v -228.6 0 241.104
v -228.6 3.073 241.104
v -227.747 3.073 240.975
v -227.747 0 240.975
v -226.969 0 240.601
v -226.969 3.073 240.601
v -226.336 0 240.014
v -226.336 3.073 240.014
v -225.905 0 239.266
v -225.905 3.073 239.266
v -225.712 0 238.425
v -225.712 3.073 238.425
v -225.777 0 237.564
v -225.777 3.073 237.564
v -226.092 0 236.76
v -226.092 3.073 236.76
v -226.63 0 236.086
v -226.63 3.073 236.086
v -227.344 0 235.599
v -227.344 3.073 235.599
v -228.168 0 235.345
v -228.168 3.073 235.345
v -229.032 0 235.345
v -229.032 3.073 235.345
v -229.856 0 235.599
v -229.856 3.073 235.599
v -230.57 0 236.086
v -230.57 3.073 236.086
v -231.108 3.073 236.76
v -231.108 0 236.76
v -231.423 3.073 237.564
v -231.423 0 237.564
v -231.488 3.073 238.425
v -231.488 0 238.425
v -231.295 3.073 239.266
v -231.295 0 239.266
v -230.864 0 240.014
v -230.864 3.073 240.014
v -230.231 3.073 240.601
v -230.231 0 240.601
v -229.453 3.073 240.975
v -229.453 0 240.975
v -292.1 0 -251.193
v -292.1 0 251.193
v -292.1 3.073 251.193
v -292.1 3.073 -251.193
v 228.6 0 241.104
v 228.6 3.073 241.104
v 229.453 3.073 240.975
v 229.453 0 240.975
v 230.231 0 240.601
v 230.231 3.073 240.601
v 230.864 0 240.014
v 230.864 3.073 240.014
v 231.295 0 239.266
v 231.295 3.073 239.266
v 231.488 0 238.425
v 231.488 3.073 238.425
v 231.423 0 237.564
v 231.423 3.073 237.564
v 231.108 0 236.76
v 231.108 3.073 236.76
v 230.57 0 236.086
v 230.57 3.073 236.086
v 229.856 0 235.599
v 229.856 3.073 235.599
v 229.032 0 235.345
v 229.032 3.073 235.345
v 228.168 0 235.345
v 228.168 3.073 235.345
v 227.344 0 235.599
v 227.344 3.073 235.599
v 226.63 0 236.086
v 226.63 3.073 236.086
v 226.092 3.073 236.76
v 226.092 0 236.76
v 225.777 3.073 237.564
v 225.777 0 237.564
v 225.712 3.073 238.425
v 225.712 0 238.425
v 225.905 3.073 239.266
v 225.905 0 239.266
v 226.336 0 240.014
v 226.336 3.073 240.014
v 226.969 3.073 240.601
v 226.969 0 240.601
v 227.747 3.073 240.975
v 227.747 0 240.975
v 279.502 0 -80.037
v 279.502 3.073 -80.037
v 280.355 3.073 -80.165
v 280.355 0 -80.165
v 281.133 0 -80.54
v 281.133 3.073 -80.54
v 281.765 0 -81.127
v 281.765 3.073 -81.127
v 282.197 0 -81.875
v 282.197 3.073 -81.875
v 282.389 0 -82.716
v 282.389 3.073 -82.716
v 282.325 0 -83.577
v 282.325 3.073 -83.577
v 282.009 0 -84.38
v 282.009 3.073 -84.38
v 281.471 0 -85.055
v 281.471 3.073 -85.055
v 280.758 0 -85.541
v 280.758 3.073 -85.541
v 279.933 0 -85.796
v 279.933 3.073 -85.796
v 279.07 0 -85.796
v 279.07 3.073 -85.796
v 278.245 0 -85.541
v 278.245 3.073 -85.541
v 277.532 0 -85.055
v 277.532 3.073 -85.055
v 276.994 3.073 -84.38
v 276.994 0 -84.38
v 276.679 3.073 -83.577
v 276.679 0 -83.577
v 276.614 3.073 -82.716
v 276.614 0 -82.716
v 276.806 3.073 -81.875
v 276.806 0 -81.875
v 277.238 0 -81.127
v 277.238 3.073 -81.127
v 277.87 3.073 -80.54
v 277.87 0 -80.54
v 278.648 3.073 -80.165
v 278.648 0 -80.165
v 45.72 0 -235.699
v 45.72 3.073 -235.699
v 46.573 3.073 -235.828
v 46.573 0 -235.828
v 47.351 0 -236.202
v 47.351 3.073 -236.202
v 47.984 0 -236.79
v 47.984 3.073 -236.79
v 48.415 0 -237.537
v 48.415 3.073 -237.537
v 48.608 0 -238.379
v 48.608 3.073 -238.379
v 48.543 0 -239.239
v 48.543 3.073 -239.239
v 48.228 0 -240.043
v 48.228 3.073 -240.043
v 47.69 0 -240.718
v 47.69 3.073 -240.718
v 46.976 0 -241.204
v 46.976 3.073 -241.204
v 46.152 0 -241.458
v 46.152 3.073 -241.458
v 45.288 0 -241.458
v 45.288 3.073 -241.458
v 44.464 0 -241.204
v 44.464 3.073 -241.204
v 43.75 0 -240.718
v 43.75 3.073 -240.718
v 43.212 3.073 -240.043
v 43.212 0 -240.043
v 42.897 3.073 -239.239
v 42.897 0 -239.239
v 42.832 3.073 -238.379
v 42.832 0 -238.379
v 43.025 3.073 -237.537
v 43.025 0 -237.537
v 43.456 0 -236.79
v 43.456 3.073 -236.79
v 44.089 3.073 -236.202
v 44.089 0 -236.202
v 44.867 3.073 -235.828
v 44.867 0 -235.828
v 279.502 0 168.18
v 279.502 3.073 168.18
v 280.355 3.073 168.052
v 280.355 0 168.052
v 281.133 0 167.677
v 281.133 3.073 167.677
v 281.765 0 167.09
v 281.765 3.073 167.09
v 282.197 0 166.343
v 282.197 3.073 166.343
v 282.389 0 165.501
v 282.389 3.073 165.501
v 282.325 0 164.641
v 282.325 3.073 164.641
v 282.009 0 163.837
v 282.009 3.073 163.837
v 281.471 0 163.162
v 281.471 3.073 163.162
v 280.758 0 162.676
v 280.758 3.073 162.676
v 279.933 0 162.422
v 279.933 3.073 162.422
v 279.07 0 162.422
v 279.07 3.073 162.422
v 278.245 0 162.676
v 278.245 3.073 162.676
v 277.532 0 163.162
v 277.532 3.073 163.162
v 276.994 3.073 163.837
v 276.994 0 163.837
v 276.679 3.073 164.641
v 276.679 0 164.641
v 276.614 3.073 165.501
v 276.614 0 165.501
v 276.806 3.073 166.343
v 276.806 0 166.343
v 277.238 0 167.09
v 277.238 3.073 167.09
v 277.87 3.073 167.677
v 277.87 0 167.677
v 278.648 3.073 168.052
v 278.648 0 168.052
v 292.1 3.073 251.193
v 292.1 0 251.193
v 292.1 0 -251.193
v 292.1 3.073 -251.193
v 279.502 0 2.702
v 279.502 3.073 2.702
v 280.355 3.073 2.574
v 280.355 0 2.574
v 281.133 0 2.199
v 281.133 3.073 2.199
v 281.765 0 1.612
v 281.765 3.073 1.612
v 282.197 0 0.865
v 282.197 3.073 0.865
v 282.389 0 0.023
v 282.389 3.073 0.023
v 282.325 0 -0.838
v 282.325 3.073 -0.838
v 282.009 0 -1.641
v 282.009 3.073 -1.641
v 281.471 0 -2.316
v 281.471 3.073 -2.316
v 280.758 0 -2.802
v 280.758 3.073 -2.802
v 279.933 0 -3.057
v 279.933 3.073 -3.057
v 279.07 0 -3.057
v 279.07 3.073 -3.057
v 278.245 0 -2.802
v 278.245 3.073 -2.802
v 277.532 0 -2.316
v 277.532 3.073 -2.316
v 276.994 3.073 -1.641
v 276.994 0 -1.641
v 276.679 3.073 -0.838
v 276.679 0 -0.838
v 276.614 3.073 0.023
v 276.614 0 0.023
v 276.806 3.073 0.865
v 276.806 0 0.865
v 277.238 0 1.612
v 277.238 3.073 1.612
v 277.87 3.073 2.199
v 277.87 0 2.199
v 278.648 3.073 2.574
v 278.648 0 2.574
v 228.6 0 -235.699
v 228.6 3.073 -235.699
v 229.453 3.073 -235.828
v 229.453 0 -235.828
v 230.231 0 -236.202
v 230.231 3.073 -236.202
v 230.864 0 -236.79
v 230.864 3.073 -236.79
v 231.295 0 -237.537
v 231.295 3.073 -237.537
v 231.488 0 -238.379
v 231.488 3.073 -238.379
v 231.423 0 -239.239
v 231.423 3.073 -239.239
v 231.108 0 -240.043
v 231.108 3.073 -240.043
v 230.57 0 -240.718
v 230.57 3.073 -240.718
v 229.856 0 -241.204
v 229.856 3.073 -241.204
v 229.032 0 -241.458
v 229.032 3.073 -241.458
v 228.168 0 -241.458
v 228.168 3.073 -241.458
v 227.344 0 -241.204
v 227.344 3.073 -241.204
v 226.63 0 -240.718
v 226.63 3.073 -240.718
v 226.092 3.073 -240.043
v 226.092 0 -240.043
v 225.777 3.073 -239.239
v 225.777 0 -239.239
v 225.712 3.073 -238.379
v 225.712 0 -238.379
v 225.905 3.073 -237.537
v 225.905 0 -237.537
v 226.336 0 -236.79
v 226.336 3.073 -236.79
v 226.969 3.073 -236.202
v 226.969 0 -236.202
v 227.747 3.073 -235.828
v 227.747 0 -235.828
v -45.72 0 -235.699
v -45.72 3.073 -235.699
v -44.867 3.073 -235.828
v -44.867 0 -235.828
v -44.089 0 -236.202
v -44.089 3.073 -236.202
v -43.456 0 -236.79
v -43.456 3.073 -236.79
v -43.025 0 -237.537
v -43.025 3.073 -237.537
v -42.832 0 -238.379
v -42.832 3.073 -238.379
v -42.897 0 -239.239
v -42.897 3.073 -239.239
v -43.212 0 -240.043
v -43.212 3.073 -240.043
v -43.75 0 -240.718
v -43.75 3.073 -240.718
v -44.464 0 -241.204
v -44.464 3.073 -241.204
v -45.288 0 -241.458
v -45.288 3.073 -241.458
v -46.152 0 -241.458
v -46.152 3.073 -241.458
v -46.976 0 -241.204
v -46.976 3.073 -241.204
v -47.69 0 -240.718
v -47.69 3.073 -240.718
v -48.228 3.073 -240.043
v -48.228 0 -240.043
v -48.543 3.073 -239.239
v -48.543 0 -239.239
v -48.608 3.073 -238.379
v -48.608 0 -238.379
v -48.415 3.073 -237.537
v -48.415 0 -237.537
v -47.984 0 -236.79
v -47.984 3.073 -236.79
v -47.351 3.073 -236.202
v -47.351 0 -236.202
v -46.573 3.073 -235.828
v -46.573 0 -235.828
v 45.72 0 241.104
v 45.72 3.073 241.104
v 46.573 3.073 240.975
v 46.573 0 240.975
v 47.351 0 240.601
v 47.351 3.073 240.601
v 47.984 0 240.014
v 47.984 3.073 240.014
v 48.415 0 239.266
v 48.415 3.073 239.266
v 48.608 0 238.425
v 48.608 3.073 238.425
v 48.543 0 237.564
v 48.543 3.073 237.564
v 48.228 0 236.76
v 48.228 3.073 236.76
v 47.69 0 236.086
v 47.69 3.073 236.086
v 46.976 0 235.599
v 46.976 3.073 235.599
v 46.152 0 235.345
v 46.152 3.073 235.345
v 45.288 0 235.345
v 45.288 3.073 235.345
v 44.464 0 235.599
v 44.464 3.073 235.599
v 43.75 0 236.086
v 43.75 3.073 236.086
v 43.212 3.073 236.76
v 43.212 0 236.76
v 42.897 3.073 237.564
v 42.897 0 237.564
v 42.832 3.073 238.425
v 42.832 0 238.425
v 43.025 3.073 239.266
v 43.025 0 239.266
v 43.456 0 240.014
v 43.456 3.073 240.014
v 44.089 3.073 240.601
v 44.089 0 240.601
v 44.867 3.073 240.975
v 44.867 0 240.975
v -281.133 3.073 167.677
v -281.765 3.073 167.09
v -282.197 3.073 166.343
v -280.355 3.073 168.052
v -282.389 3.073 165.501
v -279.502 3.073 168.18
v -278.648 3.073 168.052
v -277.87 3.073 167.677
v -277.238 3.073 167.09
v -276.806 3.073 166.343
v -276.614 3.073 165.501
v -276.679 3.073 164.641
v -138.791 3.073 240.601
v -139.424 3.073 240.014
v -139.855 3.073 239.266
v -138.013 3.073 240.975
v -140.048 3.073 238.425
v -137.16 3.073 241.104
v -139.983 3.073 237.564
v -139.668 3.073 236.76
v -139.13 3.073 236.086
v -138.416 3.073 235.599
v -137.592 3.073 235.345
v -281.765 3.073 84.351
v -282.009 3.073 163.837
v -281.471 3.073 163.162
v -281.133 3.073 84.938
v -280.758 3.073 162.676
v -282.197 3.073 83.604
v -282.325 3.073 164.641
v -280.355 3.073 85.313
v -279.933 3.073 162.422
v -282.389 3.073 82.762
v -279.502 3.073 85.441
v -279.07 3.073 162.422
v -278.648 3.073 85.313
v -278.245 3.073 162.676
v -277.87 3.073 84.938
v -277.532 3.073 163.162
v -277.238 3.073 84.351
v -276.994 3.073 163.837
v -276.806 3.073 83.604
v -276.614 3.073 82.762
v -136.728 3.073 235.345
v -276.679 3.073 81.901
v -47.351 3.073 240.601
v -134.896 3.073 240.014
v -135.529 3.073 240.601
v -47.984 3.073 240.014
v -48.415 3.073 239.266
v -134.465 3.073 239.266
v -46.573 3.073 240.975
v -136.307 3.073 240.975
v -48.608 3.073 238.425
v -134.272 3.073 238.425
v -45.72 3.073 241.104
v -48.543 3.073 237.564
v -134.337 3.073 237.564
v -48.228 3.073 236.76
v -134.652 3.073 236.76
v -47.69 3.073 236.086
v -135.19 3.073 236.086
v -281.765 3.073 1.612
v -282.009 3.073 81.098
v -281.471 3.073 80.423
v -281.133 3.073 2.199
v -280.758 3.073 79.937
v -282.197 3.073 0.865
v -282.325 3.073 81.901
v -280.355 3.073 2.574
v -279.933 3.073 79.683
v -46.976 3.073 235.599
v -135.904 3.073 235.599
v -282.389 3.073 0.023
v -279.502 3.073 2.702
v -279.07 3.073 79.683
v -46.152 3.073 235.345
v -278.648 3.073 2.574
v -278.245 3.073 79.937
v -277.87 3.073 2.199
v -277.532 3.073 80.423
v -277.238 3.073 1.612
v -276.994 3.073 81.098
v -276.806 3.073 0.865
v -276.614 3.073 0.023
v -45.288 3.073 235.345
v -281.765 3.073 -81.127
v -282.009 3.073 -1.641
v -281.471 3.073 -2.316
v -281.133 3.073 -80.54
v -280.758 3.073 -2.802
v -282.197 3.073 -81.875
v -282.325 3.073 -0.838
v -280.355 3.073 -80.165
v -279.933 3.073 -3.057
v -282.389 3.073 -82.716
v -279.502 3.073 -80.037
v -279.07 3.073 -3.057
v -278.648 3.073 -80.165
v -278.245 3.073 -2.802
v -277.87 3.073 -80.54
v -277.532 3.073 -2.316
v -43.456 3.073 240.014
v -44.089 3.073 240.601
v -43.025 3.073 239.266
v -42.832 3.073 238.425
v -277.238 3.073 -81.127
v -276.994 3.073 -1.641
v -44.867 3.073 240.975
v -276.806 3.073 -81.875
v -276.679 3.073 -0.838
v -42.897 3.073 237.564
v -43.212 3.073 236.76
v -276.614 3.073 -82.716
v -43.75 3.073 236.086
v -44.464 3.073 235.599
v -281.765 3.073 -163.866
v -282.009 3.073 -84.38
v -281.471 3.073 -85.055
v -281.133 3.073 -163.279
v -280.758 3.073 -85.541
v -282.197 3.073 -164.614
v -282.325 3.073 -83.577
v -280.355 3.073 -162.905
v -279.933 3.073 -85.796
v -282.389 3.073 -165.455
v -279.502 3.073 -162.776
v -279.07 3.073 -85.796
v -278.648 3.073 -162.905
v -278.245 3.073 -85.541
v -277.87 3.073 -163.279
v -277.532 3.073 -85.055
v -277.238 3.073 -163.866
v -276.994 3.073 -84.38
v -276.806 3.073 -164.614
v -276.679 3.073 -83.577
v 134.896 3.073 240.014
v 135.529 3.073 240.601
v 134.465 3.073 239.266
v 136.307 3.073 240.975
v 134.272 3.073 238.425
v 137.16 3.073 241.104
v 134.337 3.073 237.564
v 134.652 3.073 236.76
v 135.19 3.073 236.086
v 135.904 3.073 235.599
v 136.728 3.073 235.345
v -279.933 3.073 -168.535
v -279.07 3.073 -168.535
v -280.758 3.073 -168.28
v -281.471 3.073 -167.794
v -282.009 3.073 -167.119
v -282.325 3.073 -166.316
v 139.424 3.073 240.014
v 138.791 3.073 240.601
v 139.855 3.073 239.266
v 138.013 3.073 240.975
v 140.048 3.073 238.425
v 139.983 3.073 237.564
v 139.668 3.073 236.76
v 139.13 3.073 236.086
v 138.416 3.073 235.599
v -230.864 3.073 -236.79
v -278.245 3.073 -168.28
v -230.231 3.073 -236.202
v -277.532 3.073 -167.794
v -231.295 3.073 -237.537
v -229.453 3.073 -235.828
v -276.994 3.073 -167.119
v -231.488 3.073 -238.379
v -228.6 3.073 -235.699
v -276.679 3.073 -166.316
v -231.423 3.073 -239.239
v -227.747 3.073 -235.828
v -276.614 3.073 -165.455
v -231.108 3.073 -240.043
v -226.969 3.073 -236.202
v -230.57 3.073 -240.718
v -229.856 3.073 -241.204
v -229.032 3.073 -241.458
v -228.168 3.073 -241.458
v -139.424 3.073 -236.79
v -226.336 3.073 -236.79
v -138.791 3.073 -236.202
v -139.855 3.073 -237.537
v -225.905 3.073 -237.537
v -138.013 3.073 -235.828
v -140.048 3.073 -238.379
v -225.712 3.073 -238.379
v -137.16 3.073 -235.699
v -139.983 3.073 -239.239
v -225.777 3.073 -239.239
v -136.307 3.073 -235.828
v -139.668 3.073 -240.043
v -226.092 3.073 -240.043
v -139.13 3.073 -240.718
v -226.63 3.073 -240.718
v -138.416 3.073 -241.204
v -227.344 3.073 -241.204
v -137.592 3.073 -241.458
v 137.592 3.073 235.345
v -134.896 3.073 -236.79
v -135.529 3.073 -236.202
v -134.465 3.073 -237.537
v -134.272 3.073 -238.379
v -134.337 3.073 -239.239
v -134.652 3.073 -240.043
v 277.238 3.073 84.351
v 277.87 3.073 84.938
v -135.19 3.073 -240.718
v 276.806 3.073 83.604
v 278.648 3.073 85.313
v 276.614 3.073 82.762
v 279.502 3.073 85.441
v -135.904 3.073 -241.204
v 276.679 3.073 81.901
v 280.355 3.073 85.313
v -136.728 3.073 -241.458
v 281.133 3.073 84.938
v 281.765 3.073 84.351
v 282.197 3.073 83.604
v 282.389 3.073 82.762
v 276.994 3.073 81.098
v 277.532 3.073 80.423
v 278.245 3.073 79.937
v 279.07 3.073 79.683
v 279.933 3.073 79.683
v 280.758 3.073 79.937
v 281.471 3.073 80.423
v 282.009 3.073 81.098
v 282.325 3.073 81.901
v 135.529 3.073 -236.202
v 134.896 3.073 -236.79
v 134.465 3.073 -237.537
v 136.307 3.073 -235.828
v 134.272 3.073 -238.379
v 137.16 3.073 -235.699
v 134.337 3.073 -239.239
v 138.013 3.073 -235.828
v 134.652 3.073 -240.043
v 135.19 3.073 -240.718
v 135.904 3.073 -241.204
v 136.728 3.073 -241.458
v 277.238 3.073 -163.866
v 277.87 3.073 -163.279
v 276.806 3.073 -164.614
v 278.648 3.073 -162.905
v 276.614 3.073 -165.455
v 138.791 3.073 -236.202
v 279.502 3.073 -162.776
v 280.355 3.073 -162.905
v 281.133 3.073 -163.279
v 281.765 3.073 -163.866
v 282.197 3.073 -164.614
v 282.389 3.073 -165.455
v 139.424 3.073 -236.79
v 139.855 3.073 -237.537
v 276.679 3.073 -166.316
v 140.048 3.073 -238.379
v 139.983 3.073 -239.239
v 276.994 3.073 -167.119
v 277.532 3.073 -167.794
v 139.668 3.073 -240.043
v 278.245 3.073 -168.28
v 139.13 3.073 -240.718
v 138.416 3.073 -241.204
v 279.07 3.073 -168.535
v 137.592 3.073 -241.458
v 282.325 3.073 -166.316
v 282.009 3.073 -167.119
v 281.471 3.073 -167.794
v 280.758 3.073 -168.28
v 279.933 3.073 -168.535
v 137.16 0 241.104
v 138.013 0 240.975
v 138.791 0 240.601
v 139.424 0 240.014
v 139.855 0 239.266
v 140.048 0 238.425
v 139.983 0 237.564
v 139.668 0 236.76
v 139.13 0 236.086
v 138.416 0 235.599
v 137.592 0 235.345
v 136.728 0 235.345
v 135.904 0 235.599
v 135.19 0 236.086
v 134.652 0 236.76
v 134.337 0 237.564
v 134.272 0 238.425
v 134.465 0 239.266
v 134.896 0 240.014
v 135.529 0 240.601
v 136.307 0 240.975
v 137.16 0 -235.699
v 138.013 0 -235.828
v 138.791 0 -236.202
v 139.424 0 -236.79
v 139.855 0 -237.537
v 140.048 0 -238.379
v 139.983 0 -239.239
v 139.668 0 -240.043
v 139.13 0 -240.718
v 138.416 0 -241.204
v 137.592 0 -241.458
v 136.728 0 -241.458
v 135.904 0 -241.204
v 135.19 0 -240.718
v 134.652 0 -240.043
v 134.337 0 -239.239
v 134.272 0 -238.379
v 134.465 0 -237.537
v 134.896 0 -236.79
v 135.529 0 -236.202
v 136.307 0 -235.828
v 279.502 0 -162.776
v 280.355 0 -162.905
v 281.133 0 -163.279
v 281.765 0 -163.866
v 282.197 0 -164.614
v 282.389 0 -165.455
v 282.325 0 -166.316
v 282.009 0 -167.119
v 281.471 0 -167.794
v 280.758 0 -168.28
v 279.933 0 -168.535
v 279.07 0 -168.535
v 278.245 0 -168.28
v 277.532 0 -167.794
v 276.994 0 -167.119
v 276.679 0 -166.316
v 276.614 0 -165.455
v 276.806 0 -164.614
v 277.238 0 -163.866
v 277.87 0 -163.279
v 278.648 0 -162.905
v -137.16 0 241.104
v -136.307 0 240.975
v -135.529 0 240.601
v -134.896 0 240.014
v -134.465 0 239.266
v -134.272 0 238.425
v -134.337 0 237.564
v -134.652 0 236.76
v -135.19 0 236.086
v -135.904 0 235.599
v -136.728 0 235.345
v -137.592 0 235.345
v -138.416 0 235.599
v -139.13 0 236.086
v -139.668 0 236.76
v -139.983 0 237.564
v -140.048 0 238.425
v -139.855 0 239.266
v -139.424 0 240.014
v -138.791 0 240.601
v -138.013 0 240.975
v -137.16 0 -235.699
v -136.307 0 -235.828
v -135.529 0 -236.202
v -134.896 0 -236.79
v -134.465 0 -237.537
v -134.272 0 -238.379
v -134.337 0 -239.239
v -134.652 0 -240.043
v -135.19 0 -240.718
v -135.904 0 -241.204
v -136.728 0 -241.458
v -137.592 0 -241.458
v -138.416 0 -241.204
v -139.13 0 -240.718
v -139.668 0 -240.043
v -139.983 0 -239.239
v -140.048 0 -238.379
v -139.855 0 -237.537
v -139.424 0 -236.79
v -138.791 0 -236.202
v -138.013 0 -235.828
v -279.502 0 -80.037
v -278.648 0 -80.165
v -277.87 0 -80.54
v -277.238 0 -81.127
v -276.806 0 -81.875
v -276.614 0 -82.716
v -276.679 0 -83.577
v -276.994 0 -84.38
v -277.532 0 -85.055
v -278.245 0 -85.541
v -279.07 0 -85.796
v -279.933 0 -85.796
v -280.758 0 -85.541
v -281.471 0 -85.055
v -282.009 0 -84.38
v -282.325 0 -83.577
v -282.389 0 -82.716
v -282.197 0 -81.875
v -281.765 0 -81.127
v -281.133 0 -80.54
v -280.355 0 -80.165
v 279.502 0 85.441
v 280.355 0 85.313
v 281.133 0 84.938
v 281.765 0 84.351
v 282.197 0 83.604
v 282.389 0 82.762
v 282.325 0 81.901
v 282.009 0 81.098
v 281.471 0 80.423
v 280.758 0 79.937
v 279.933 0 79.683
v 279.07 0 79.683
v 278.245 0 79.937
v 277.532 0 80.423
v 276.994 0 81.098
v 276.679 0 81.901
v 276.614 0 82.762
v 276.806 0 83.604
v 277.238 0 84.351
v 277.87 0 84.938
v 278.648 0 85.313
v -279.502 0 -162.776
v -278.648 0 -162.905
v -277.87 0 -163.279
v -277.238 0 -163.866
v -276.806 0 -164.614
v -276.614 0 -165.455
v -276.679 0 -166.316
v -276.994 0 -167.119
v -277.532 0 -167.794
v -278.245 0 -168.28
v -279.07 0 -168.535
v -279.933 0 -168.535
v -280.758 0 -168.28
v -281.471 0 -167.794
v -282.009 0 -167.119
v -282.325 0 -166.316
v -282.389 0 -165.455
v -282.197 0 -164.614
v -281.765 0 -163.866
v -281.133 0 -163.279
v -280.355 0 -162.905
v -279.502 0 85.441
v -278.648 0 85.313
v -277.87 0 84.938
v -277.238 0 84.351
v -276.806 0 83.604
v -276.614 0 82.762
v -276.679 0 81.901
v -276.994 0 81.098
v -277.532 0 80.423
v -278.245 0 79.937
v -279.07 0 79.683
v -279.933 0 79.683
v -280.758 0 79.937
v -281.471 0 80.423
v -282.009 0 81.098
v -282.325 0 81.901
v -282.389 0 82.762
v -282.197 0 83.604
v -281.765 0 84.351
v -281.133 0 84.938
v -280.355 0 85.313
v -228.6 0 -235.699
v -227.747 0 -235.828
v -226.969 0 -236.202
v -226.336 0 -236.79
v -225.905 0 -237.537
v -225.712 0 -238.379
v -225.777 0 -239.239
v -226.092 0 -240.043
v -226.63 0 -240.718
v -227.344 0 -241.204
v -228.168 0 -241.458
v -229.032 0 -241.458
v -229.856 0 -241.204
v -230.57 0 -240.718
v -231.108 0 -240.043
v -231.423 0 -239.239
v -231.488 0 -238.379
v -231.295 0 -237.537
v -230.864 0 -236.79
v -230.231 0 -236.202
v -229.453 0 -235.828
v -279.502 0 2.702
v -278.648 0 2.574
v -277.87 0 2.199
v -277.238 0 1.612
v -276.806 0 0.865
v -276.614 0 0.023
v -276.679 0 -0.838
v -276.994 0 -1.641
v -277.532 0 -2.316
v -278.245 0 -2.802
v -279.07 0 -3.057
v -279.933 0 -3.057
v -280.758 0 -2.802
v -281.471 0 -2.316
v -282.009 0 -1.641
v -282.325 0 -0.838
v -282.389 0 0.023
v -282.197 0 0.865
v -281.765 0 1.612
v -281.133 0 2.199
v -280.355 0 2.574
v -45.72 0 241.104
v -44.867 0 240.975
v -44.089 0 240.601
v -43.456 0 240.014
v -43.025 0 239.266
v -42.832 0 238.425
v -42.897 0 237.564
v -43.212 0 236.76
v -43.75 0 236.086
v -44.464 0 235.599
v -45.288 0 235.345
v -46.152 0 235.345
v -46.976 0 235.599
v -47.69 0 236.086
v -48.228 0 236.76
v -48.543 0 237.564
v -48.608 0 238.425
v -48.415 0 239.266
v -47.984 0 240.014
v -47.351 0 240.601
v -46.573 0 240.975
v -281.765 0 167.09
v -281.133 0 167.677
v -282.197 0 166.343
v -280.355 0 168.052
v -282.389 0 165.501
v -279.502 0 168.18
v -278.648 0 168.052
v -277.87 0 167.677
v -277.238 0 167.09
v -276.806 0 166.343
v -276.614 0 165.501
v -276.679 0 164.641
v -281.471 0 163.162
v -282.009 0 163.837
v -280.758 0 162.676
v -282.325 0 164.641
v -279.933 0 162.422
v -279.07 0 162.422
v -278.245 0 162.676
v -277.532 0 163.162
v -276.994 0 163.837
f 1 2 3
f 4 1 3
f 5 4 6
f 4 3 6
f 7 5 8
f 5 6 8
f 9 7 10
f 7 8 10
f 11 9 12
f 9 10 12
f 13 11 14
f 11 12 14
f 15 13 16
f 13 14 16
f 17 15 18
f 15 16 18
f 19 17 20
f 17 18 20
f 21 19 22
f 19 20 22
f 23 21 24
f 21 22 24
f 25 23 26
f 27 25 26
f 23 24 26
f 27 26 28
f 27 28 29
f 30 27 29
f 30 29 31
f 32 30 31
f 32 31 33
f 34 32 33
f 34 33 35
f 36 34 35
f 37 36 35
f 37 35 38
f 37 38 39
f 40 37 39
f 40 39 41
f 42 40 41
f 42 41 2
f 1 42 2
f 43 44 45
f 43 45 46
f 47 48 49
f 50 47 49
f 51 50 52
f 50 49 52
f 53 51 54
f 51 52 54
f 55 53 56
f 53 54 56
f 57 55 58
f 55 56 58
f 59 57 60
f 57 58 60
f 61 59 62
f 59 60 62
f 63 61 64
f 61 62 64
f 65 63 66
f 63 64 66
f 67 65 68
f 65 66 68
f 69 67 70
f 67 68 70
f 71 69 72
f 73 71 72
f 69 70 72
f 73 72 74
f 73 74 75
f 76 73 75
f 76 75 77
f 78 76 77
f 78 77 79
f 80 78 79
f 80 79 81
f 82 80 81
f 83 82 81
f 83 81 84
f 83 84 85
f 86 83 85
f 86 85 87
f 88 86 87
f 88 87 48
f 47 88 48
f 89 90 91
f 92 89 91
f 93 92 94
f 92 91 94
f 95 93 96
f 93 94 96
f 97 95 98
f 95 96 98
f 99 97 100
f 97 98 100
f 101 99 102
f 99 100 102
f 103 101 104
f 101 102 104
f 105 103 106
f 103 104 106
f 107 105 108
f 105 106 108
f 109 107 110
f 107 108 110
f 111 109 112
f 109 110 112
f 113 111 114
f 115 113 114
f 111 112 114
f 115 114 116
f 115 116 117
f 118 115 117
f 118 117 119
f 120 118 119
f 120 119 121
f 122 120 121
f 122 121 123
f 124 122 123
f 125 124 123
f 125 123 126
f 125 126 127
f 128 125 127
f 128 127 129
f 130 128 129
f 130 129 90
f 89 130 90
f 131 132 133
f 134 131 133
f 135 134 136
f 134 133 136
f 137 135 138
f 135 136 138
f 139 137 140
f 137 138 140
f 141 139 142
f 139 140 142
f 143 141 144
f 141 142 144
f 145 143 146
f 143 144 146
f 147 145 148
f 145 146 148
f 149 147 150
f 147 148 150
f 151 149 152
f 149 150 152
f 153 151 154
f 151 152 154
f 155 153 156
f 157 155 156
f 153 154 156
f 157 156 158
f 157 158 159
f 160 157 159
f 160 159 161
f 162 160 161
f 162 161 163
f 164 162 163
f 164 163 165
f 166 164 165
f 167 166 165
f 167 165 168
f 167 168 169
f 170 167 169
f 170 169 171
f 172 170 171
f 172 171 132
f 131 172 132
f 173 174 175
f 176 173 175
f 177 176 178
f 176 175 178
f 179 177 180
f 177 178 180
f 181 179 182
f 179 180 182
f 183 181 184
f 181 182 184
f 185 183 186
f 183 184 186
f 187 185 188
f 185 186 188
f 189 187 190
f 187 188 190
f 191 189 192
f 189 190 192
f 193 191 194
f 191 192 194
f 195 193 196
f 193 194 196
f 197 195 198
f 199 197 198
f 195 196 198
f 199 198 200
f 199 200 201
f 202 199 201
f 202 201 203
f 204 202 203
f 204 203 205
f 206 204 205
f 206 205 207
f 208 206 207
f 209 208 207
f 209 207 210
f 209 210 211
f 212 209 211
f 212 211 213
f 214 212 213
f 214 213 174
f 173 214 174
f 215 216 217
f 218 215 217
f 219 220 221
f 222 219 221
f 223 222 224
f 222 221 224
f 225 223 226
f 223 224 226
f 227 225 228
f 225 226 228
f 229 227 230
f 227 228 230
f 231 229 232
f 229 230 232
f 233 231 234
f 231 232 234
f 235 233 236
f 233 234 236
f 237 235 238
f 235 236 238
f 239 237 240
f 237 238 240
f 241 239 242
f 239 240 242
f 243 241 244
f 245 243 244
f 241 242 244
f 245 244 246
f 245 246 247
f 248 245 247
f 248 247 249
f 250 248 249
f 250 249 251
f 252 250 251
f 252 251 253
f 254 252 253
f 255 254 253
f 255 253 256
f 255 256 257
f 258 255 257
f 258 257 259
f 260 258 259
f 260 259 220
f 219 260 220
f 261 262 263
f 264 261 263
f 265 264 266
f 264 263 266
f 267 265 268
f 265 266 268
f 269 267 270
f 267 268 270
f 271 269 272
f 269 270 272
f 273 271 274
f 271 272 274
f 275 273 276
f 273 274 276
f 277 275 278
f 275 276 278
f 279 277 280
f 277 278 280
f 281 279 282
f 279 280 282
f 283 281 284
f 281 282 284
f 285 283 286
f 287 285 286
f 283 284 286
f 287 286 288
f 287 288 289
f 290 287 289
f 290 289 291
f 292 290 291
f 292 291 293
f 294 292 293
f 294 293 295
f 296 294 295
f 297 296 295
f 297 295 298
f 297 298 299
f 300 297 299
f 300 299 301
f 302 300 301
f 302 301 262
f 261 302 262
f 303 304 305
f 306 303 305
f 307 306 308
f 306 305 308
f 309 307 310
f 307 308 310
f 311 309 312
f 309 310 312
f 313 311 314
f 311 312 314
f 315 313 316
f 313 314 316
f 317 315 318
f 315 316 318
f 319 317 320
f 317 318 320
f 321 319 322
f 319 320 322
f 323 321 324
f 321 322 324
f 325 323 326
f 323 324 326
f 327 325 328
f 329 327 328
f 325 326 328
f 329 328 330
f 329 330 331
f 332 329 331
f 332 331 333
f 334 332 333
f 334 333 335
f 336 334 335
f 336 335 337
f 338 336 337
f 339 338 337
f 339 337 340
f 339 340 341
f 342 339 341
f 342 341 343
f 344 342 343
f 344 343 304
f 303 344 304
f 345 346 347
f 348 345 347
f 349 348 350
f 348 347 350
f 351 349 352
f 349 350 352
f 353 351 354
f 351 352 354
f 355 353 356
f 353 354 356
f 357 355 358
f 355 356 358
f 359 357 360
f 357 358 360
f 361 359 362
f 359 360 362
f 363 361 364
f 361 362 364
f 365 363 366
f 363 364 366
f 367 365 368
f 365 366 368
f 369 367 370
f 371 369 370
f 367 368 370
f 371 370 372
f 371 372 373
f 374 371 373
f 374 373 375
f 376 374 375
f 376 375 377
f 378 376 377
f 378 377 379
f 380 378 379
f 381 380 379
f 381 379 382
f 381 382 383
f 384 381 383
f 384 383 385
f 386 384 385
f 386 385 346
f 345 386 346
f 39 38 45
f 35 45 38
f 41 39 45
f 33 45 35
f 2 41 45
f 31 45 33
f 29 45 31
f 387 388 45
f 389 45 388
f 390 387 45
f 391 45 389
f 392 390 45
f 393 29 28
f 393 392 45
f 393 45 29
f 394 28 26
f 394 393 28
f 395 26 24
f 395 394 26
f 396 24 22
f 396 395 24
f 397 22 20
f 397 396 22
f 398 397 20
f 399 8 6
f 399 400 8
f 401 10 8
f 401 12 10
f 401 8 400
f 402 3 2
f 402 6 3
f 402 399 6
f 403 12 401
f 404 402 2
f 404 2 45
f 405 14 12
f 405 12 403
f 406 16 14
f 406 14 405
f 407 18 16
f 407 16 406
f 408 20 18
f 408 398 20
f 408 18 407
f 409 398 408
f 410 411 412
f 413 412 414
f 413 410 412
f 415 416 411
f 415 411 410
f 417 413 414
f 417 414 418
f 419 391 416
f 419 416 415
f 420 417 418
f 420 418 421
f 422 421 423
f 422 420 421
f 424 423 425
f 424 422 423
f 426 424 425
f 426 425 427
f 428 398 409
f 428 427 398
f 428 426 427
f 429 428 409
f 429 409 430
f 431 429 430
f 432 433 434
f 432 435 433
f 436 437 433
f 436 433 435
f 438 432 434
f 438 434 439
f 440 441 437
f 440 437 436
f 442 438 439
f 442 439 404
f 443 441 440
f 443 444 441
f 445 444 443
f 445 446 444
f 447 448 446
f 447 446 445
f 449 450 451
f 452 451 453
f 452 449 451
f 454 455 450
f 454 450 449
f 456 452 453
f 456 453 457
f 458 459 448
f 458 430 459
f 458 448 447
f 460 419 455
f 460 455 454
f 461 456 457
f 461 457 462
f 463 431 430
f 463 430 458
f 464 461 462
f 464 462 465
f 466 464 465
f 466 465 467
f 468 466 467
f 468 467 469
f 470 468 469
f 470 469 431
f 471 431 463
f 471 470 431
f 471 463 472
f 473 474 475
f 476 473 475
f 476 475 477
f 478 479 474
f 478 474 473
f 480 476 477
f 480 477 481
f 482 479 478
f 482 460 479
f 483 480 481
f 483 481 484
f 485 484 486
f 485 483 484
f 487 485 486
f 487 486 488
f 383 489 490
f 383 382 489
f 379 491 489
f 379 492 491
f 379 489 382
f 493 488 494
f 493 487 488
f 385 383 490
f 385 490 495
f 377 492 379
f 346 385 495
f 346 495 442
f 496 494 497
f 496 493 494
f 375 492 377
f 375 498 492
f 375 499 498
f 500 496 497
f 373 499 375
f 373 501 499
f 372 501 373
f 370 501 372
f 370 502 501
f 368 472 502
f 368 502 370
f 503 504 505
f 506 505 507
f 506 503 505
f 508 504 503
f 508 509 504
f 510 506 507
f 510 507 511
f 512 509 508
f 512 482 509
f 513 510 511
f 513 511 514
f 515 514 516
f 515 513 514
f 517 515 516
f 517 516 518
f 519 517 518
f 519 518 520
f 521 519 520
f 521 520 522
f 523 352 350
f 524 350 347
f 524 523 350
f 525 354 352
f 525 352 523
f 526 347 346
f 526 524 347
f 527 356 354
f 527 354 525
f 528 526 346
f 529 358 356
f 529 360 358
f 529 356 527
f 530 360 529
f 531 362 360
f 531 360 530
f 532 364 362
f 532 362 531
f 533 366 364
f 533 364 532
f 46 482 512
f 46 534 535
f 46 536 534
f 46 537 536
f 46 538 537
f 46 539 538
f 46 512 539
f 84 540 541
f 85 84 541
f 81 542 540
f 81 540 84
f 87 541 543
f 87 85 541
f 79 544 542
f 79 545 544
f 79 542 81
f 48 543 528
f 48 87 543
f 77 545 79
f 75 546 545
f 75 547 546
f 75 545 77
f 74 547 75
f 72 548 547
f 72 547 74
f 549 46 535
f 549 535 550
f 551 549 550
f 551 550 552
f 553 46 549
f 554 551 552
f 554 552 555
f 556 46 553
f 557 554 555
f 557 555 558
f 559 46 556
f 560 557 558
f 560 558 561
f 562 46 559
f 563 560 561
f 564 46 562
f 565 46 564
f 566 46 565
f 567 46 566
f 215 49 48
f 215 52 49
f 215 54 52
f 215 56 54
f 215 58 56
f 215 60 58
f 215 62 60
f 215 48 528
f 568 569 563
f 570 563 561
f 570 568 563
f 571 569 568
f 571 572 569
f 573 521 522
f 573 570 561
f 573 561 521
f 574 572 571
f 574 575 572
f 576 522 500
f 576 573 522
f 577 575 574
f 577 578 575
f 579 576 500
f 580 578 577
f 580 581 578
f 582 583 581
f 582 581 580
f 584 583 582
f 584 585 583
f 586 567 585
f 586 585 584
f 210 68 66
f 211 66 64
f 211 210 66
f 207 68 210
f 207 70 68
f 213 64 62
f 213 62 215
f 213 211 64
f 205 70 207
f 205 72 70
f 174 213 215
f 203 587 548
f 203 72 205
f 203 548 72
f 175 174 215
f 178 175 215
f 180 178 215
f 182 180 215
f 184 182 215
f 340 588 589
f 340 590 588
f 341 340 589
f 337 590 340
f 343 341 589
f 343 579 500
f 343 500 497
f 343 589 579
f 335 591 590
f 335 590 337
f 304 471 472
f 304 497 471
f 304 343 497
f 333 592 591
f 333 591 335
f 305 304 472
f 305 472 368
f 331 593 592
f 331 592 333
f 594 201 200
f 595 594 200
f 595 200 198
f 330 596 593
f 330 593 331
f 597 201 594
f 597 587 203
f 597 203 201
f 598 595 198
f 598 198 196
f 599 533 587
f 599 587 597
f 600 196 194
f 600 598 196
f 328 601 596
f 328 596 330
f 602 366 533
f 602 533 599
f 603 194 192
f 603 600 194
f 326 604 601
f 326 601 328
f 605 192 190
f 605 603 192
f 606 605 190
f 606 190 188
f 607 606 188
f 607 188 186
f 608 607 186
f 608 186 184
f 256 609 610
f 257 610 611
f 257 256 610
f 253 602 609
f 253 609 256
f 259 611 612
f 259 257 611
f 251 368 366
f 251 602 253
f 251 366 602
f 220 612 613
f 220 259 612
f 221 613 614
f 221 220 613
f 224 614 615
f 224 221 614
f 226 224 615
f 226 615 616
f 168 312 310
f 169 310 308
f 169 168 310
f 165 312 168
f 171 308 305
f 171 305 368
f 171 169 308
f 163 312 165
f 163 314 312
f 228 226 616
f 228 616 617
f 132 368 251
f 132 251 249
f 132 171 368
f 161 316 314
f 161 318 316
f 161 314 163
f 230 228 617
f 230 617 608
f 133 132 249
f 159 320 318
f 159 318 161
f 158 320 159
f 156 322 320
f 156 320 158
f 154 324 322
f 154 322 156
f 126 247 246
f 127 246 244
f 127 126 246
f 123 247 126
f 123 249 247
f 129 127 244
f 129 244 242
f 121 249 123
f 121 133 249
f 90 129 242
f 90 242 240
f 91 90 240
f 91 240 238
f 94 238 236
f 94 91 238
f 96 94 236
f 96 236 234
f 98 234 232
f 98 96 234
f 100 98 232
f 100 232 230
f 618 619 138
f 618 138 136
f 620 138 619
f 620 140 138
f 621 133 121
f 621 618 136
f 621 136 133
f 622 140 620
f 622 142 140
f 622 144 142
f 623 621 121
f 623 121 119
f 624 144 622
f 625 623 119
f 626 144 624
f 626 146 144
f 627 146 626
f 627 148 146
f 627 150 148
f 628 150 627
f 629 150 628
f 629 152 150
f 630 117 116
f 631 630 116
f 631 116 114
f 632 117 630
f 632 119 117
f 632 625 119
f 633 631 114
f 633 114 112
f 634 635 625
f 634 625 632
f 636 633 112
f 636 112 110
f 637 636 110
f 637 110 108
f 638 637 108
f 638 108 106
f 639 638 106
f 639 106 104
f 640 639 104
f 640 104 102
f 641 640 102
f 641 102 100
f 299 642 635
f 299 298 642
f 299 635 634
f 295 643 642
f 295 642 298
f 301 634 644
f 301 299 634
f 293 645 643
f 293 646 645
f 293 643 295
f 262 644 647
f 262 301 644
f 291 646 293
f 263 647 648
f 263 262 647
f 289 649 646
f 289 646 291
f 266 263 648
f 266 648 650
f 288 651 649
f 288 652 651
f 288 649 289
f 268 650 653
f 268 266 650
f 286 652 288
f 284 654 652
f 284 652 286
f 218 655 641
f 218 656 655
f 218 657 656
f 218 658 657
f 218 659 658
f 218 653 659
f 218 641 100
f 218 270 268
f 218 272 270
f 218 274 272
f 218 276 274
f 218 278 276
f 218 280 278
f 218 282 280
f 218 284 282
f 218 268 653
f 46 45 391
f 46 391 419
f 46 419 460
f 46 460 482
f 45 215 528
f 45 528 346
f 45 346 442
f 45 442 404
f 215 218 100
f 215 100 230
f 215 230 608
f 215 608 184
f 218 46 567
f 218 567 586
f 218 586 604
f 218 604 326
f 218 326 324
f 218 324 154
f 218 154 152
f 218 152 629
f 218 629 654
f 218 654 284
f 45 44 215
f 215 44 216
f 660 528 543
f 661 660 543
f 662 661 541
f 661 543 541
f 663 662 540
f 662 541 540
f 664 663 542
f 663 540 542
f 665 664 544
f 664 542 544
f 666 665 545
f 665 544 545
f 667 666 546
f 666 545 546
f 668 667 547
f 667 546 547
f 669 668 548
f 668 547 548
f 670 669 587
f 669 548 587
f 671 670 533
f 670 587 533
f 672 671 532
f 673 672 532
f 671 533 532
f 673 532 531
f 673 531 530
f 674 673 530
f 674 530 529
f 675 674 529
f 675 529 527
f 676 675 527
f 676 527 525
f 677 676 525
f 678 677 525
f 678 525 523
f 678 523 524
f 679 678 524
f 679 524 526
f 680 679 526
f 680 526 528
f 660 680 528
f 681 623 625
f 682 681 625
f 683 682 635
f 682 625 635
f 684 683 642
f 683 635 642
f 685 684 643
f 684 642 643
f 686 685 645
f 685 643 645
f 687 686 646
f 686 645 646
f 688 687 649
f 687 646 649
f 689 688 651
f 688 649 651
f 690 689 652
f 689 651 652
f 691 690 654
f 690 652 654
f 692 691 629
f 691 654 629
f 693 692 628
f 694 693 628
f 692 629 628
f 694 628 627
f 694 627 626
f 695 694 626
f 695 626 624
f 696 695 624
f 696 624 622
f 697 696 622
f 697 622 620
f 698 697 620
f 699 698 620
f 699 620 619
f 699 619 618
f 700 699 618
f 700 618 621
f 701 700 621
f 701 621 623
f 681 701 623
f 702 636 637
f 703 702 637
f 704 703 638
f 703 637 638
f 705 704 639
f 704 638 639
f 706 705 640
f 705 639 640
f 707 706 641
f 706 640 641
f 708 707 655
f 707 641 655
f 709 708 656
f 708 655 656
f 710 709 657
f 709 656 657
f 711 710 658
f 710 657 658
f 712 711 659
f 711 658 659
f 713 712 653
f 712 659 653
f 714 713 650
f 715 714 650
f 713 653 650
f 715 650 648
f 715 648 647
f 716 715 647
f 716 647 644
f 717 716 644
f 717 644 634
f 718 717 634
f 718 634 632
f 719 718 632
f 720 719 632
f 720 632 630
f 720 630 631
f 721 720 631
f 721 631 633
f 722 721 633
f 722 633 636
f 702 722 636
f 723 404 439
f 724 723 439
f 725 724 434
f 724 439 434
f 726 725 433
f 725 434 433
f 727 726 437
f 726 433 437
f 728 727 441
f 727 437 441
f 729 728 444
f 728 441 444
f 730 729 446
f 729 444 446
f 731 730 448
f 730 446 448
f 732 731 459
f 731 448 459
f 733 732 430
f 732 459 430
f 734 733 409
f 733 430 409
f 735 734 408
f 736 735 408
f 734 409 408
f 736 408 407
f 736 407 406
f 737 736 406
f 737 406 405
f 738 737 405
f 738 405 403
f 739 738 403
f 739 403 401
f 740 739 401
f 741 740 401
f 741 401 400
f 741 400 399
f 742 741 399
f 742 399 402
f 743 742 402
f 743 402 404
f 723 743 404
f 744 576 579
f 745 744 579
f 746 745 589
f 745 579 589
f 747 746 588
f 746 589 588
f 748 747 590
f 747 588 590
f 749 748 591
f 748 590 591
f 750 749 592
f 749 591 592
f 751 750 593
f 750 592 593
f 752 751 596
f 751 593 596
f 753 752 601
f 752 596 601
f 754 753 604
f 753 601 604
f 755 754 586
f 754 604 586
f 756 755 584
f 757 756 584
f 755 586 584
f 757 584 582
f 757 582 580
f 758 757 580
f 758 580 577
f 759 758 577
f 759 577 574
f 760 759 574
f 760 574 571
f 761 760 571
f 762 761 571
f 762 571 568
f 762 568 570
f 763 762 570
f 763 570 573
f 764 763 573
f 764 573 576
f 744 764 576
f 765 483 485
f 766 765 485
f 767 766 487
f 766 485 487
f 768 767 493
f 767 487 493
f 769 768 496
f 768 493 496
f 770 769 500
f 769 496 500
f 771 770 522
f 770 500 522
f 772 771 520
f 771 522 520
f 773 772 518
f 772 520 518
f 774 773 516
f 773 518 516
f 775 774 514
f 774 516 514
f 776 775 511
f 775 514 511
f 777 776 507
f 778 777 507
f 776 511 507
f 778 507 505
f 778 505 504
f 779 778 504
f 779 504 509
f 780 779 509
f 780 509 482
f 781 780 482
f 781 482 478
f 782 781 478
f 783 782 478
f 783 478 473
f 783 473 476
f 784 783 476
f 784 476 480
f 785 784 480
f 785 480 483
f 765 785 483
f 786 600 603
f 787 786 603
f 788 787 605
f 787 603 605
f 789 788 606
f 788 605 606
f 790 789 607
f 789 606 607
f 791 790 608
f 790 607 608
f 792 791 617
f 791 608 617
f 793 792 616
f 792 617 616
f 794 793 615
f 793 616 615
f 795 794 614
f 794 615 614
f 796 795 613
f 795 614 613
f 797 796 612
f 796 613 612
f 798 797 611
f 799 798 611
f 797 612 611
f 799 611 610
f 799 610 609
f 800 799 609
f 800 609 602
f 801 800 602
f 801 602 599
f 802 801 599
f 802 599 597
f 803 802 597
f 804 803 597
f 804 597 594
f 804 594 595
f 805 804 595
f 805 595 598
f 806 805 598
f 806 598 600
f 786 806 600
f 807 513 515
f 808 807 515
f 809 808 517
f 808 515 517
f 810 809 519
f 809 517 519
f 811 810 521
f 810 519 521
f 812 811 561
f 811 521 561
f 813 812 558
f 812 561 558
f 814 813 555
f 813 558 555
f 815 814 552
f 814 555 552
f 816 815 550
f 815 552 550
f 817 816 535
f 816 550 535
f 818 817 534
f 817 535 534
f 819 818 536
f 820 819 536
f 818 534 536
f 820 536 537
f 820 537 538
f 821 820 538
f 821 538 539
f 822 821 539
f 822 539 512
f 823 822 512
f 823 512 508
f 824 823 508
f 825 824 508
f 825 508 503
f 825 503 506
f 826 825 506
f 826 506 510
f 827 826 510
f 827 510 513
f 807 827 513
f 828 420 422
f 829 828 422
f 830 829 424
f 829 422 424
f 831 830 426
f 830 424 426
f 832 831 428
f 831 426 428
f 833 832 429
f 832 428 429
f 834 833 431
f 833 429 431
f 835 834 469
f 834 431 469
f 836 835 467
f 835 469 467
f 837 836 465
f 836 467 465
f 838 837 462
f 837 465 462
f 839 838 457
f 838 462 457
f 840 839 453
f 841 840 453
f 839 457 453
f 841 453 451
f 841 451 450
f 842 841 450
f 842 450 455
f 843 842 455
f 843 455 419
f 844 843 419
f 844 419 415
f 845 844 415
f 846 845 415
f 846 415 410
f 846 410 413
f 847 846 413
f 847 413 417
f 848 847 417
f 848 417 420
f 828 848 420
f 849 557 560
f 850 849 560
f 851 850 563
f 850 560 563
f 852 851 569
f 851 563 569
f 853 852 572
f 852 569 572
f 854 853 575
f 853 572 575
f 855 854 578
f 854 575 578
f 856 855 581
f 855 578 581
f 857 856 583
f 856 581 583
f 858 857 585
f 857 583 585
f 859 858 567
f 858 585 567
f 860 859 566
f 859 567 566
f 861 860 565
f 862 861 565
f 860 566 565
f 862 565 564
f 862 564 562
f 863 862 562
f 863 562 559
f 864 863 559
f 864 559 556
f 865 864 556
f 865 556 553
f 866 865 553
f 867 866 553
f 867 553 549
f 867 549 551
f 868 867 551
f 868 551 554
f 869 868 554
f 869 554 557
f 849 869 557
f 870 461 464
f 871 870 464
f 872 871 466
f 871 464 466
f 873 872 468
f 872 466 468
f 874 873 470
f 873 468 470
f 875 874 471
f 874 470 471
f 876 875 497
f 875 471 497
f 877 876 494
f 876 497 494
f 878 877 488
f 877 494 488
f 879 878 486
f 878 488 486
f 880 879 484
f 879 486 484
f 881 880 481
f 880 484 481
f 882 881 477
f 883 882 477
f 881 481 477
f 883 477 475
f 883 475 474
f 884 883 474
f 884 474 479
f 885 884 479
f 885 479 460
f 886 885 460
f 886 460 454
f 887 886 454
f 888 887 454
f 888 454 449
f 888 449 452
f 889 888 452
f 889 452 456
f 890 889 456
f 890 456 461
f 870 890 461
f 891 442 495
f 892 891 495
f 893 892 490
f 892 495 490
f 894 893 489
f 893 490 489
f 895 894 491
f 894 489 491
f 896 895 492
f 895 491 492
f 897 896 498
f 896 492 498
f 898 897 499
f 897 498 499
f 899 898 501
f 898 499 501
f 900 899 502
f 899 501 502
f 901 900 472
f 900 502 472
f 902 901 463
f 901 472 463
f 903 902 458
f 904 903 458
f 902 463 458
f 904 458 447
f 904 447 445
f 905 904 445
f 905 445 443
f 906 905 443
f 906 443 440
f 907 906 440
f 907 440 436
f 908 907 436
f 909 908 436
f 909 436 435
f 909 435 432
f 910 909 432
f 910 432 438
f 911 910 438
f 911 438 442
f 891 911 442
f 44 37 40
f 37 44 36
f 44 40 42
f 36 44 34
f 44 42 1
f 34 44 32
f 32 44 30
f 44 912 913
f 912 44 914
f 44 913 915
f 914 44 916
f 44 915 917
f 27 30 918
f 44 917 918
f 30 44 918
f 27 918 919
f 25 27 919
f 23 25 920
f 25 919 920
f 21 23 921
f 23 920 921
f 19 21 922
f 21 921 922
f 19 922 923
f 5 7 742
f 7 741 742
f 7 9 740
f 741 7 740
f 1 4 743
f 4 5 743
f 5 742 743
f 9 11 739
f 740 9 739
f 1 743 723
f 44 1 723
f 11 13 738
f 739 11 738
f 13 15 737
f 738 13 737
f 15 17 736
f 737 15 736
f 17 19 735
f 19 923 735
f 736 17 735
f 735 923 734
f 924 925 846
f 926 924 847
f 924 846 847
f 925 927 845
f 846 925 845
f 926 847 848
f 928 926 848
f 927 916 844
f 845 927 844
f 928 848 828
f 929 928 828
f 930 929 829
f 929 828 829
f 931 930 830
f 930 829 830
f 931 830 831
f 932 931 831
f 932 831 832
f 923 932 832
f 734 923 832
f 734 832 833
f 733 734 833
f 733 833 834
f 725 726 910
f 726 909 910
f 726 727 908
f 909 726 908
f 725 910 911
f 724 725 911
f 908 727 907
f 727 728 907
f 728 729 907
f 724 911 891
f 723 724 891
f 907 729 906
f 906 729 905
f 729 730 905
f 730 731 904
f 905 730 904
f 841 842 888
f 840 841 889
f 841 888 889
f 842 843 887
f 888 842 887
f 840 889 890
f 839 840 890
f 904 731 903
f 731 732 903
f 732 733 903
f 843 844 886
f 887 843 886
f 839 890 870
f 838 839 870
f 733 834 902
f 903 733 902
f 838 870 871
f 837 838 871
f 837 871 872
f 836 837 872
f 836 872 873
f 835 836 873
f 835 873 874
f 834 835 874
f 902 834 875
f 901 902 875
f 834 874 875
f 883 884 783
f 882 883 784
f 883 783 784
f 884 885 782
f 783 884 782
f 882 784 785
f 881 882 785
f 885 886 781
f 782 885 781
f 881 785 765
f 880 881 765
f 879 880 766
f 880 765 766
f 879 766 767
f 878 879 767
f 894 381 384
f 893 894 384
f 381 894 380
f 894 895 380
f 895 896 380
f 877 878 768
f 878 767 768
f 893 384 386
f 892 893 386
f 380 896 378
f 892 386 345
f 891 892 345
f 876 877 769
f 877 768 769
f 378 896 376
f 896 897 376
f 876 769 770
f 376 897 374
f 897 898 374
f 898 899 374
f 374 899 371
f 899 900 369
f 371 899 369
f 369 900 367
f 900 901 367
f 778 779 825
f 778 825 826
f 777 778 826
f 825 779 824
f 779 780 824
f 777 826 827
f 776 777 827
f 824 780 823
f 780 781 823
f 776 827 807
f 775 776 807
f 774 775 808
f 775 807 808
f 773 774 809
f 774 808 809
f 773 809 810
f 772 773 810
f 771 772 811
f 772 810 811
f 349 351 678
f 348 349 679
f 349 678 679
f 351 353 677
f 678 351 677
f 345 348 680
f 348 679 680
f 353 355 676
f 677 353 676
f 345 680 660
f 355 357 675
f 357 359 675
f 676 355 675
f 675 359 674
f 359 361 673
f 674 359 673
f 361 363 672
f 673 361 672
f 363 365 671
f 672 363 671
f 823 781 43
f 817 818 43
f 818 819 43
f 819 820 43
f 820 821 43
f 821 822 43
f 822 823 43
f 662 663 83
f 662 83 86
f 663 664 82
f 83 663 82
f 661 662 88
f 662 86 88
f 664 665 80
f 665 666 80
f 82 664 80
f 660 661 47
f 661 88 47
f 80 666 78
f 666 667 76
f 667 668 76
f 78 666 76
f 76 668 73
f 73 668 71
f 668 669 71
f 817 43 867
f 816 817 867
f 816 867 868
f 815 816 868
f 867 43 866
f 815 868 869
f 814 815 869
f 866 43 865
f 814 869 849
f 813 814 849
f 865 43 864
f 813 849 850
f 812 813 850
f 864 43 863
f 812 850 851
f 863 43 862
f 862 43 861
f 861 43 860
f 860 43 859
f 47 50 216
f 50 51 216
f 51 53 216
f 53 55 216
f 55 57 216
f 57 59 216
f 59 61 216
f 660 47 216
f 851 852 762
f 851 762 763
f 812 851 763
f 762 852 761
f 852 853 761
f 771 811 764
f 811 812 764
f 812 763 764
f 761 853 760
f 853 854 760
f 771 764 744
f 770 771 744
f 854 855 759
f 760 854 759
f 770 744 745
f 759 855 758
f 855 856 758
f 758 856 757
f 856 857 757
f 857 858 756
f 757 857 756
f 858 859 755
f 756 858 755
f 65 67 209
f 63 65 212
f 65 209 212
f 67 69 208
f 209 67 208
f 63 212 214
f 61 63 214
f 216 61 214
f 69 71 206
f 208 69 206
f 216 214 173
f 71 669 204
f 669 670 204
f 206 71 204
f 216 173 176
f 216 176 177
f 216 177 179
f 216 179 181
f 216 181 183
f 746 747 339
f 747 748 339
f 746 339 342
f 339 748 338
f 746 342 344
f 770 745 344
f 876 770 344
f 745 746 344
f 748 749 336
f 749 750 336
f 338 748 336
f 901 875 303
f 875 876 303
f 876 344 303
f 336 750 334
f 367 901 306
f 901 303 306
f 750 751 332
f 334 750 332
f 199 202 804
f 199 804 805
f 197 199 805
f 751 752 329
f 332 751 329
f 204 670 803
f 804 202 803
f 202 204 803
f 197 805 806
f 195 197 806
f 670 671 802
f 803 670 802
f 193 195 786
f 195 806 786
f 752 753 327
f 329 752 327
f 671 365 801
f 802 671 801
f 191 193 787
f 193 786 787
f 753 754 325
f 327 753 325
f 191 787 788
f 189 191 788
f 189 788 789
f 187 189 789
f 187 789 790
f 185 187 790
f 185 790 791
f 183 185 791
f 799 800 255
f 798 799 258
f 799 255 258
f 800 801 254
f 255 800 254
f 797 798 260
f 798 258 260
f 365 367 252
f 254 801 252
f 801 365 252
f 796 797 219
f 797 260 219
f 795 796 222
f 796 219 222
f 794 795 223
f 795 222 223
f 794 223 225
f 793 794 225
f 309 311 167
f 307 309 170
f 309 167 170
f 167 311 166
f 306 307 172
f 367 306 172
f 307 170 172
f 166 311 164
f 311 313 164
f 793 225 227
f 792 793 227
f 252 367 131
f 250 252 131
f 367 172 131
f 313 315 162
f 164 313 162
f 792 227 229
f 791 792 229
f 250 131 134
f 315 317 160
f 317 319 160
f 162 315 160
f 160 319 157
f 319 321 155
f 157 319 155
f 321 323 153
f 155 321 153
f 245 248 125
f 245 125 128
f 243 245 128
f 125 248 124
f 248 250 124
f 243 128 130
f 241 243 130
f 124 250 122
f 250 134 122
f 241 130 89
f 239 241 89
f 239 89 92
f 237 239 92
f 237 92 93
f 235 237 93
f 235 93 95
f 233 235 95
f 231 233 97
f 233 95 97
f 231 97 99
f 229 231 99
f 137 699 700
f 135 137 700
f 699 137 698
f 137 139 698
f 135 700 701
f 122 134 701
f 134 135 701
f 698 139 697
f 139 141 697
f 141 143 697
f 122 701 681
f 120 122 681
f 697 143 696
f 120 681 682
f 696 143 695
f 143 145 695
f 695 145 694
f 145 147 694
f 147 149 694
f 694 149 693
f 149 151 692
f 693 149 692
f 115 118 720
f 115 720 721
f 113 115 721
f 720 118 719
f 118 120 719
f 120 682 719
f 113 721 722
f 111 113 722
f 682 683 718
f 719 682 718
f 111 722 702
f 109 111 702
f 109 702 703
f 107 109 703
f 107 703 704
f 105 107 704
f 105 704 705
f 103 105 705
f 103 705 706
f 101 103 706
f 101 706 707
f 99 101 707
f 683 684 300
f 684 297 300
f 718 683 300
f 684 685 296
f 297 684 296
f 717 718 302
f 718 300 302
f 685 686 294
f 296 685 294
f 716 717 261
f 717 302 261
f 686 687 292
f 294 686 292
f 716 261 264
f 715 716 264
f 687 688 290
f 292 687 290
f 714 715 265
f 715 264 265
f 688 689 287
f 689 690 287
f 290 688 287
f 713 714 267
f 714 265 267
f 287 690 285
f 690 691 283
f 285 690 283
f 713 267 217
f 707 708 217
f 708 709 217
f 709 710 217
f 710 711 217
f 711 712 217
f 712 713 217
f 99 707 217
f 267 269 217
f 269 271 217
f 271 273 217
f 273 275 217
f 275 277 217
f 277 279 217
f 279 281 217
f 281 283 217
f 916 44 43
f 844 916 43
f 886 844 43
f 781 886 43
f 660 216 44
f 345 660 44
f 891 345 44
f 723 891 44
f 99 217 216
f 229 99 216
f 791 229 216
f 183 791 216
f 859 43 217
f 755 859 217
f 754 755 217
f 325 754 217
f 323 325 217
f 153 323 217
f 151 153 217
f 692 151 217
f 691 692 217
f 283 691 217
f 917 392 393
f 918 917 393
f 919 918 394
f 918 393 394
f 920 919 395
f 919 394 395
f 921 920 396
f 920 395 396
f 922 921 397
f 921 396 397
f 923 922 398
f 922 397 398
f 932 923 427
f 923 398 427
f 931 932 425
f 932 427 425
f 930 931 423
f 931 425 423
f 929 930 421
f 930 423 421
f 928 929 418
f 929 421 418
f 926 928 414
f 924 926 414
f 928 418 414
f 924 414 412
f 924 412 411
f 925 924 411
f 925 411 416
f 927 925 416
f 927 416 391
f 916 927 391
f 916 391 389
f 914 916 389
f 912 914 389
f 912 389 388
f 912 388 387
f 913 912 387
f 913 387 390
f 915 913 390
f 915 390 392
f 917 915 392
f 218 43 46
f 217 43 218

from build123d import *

# Parameters (mm, degrees)
SKETCH1_W                = 584.2
SKETCH1_H                = 502.3866
TOPPLATE_DEPTH           = 3.0734
SKETCH2_R                = 2.8956
FRONT_REARTOPHOLES_DEPTH = 386.26605061
LPATTERN1_COUNT          = 6
LPATTERN1_PITCH          = 91.44
SKETCH3_R                = 2.8956
CUT_EXTRUDE2_DEPTH       = 386.26605061
LPATTERN2_COUNT          = 5
LPATTERN2_PITCH          = 82.739099952


with BuildPart() as part:
    # Sketch1 → TopPlate (new body)
    with BuildSketch(Plane(origin=(0, 0, 0), x_dir=(1, 0, 0), z_dir=(0, 1, 0))):
        Rectangle(SKETCH1_W, SKETCH1_H)
    extrude(amount=TOPPLATE_DEPTH)

    # Sketch2 → Front/RearTopHoles (cut, through all)
    with BuildSketch(Plane(origin=(0, 3.0734, 0), x_dir=(1, 0, 0), z_dir=(0, 1, 0))):
        with Locations(Location((-228.6, 238.5949, 0), (0, 0, 270))):
            Circle(SKETCH2_R)
        with Locations(Location((-228.6, -238.208299808, 0), (0, 0, 270))):
            Circle(SKETCH2_R)
    front_reartopholes = extrude(amount=-FRONT_REARTOPHOLES_DEPTH, mode=Mode.SUBTRACT)

    # LPattern1: Front/RearTopHoles ×6
    with Locations(*[(i * LPATTERN1_PITCH, 0, 0) for i in range(1, LPATTERN1_COUNT)]):
        add(front_reartopholes, mode=Mode.SUBTRACT)

    # Sketch3 → Cut-Extrude2 (cut, through all)
    with BuildSketch(Plane(origin=(0, 3.0734, 0), x_dir=(1, 0, 0), z_dir=(0, 1, 0))):
        with Locations(Location((-279.5016, 165.6715, 0), (0, 0, 270))):
            Circle(SKETCH3_R)
        with Locations(Location((279.5016, 165.6715, 0), (0, 0, 270))):
            Circle(SKETCH3_R)
    cut_extrude2 = extrude(amount=-CUT_EXTRUDE2_DEPTH, mode=Mode.SUBTRACT)

    # LPattern2: Cut-Extrude2 ×5
    with Locations(*[(0, 0, i * LPATTERN2_PITCH) for i in range(1, LPATTERN2_COUNT)]):
        add(cut_extrude2, mode=Mode.SUBTRACT)


solid = part.part
